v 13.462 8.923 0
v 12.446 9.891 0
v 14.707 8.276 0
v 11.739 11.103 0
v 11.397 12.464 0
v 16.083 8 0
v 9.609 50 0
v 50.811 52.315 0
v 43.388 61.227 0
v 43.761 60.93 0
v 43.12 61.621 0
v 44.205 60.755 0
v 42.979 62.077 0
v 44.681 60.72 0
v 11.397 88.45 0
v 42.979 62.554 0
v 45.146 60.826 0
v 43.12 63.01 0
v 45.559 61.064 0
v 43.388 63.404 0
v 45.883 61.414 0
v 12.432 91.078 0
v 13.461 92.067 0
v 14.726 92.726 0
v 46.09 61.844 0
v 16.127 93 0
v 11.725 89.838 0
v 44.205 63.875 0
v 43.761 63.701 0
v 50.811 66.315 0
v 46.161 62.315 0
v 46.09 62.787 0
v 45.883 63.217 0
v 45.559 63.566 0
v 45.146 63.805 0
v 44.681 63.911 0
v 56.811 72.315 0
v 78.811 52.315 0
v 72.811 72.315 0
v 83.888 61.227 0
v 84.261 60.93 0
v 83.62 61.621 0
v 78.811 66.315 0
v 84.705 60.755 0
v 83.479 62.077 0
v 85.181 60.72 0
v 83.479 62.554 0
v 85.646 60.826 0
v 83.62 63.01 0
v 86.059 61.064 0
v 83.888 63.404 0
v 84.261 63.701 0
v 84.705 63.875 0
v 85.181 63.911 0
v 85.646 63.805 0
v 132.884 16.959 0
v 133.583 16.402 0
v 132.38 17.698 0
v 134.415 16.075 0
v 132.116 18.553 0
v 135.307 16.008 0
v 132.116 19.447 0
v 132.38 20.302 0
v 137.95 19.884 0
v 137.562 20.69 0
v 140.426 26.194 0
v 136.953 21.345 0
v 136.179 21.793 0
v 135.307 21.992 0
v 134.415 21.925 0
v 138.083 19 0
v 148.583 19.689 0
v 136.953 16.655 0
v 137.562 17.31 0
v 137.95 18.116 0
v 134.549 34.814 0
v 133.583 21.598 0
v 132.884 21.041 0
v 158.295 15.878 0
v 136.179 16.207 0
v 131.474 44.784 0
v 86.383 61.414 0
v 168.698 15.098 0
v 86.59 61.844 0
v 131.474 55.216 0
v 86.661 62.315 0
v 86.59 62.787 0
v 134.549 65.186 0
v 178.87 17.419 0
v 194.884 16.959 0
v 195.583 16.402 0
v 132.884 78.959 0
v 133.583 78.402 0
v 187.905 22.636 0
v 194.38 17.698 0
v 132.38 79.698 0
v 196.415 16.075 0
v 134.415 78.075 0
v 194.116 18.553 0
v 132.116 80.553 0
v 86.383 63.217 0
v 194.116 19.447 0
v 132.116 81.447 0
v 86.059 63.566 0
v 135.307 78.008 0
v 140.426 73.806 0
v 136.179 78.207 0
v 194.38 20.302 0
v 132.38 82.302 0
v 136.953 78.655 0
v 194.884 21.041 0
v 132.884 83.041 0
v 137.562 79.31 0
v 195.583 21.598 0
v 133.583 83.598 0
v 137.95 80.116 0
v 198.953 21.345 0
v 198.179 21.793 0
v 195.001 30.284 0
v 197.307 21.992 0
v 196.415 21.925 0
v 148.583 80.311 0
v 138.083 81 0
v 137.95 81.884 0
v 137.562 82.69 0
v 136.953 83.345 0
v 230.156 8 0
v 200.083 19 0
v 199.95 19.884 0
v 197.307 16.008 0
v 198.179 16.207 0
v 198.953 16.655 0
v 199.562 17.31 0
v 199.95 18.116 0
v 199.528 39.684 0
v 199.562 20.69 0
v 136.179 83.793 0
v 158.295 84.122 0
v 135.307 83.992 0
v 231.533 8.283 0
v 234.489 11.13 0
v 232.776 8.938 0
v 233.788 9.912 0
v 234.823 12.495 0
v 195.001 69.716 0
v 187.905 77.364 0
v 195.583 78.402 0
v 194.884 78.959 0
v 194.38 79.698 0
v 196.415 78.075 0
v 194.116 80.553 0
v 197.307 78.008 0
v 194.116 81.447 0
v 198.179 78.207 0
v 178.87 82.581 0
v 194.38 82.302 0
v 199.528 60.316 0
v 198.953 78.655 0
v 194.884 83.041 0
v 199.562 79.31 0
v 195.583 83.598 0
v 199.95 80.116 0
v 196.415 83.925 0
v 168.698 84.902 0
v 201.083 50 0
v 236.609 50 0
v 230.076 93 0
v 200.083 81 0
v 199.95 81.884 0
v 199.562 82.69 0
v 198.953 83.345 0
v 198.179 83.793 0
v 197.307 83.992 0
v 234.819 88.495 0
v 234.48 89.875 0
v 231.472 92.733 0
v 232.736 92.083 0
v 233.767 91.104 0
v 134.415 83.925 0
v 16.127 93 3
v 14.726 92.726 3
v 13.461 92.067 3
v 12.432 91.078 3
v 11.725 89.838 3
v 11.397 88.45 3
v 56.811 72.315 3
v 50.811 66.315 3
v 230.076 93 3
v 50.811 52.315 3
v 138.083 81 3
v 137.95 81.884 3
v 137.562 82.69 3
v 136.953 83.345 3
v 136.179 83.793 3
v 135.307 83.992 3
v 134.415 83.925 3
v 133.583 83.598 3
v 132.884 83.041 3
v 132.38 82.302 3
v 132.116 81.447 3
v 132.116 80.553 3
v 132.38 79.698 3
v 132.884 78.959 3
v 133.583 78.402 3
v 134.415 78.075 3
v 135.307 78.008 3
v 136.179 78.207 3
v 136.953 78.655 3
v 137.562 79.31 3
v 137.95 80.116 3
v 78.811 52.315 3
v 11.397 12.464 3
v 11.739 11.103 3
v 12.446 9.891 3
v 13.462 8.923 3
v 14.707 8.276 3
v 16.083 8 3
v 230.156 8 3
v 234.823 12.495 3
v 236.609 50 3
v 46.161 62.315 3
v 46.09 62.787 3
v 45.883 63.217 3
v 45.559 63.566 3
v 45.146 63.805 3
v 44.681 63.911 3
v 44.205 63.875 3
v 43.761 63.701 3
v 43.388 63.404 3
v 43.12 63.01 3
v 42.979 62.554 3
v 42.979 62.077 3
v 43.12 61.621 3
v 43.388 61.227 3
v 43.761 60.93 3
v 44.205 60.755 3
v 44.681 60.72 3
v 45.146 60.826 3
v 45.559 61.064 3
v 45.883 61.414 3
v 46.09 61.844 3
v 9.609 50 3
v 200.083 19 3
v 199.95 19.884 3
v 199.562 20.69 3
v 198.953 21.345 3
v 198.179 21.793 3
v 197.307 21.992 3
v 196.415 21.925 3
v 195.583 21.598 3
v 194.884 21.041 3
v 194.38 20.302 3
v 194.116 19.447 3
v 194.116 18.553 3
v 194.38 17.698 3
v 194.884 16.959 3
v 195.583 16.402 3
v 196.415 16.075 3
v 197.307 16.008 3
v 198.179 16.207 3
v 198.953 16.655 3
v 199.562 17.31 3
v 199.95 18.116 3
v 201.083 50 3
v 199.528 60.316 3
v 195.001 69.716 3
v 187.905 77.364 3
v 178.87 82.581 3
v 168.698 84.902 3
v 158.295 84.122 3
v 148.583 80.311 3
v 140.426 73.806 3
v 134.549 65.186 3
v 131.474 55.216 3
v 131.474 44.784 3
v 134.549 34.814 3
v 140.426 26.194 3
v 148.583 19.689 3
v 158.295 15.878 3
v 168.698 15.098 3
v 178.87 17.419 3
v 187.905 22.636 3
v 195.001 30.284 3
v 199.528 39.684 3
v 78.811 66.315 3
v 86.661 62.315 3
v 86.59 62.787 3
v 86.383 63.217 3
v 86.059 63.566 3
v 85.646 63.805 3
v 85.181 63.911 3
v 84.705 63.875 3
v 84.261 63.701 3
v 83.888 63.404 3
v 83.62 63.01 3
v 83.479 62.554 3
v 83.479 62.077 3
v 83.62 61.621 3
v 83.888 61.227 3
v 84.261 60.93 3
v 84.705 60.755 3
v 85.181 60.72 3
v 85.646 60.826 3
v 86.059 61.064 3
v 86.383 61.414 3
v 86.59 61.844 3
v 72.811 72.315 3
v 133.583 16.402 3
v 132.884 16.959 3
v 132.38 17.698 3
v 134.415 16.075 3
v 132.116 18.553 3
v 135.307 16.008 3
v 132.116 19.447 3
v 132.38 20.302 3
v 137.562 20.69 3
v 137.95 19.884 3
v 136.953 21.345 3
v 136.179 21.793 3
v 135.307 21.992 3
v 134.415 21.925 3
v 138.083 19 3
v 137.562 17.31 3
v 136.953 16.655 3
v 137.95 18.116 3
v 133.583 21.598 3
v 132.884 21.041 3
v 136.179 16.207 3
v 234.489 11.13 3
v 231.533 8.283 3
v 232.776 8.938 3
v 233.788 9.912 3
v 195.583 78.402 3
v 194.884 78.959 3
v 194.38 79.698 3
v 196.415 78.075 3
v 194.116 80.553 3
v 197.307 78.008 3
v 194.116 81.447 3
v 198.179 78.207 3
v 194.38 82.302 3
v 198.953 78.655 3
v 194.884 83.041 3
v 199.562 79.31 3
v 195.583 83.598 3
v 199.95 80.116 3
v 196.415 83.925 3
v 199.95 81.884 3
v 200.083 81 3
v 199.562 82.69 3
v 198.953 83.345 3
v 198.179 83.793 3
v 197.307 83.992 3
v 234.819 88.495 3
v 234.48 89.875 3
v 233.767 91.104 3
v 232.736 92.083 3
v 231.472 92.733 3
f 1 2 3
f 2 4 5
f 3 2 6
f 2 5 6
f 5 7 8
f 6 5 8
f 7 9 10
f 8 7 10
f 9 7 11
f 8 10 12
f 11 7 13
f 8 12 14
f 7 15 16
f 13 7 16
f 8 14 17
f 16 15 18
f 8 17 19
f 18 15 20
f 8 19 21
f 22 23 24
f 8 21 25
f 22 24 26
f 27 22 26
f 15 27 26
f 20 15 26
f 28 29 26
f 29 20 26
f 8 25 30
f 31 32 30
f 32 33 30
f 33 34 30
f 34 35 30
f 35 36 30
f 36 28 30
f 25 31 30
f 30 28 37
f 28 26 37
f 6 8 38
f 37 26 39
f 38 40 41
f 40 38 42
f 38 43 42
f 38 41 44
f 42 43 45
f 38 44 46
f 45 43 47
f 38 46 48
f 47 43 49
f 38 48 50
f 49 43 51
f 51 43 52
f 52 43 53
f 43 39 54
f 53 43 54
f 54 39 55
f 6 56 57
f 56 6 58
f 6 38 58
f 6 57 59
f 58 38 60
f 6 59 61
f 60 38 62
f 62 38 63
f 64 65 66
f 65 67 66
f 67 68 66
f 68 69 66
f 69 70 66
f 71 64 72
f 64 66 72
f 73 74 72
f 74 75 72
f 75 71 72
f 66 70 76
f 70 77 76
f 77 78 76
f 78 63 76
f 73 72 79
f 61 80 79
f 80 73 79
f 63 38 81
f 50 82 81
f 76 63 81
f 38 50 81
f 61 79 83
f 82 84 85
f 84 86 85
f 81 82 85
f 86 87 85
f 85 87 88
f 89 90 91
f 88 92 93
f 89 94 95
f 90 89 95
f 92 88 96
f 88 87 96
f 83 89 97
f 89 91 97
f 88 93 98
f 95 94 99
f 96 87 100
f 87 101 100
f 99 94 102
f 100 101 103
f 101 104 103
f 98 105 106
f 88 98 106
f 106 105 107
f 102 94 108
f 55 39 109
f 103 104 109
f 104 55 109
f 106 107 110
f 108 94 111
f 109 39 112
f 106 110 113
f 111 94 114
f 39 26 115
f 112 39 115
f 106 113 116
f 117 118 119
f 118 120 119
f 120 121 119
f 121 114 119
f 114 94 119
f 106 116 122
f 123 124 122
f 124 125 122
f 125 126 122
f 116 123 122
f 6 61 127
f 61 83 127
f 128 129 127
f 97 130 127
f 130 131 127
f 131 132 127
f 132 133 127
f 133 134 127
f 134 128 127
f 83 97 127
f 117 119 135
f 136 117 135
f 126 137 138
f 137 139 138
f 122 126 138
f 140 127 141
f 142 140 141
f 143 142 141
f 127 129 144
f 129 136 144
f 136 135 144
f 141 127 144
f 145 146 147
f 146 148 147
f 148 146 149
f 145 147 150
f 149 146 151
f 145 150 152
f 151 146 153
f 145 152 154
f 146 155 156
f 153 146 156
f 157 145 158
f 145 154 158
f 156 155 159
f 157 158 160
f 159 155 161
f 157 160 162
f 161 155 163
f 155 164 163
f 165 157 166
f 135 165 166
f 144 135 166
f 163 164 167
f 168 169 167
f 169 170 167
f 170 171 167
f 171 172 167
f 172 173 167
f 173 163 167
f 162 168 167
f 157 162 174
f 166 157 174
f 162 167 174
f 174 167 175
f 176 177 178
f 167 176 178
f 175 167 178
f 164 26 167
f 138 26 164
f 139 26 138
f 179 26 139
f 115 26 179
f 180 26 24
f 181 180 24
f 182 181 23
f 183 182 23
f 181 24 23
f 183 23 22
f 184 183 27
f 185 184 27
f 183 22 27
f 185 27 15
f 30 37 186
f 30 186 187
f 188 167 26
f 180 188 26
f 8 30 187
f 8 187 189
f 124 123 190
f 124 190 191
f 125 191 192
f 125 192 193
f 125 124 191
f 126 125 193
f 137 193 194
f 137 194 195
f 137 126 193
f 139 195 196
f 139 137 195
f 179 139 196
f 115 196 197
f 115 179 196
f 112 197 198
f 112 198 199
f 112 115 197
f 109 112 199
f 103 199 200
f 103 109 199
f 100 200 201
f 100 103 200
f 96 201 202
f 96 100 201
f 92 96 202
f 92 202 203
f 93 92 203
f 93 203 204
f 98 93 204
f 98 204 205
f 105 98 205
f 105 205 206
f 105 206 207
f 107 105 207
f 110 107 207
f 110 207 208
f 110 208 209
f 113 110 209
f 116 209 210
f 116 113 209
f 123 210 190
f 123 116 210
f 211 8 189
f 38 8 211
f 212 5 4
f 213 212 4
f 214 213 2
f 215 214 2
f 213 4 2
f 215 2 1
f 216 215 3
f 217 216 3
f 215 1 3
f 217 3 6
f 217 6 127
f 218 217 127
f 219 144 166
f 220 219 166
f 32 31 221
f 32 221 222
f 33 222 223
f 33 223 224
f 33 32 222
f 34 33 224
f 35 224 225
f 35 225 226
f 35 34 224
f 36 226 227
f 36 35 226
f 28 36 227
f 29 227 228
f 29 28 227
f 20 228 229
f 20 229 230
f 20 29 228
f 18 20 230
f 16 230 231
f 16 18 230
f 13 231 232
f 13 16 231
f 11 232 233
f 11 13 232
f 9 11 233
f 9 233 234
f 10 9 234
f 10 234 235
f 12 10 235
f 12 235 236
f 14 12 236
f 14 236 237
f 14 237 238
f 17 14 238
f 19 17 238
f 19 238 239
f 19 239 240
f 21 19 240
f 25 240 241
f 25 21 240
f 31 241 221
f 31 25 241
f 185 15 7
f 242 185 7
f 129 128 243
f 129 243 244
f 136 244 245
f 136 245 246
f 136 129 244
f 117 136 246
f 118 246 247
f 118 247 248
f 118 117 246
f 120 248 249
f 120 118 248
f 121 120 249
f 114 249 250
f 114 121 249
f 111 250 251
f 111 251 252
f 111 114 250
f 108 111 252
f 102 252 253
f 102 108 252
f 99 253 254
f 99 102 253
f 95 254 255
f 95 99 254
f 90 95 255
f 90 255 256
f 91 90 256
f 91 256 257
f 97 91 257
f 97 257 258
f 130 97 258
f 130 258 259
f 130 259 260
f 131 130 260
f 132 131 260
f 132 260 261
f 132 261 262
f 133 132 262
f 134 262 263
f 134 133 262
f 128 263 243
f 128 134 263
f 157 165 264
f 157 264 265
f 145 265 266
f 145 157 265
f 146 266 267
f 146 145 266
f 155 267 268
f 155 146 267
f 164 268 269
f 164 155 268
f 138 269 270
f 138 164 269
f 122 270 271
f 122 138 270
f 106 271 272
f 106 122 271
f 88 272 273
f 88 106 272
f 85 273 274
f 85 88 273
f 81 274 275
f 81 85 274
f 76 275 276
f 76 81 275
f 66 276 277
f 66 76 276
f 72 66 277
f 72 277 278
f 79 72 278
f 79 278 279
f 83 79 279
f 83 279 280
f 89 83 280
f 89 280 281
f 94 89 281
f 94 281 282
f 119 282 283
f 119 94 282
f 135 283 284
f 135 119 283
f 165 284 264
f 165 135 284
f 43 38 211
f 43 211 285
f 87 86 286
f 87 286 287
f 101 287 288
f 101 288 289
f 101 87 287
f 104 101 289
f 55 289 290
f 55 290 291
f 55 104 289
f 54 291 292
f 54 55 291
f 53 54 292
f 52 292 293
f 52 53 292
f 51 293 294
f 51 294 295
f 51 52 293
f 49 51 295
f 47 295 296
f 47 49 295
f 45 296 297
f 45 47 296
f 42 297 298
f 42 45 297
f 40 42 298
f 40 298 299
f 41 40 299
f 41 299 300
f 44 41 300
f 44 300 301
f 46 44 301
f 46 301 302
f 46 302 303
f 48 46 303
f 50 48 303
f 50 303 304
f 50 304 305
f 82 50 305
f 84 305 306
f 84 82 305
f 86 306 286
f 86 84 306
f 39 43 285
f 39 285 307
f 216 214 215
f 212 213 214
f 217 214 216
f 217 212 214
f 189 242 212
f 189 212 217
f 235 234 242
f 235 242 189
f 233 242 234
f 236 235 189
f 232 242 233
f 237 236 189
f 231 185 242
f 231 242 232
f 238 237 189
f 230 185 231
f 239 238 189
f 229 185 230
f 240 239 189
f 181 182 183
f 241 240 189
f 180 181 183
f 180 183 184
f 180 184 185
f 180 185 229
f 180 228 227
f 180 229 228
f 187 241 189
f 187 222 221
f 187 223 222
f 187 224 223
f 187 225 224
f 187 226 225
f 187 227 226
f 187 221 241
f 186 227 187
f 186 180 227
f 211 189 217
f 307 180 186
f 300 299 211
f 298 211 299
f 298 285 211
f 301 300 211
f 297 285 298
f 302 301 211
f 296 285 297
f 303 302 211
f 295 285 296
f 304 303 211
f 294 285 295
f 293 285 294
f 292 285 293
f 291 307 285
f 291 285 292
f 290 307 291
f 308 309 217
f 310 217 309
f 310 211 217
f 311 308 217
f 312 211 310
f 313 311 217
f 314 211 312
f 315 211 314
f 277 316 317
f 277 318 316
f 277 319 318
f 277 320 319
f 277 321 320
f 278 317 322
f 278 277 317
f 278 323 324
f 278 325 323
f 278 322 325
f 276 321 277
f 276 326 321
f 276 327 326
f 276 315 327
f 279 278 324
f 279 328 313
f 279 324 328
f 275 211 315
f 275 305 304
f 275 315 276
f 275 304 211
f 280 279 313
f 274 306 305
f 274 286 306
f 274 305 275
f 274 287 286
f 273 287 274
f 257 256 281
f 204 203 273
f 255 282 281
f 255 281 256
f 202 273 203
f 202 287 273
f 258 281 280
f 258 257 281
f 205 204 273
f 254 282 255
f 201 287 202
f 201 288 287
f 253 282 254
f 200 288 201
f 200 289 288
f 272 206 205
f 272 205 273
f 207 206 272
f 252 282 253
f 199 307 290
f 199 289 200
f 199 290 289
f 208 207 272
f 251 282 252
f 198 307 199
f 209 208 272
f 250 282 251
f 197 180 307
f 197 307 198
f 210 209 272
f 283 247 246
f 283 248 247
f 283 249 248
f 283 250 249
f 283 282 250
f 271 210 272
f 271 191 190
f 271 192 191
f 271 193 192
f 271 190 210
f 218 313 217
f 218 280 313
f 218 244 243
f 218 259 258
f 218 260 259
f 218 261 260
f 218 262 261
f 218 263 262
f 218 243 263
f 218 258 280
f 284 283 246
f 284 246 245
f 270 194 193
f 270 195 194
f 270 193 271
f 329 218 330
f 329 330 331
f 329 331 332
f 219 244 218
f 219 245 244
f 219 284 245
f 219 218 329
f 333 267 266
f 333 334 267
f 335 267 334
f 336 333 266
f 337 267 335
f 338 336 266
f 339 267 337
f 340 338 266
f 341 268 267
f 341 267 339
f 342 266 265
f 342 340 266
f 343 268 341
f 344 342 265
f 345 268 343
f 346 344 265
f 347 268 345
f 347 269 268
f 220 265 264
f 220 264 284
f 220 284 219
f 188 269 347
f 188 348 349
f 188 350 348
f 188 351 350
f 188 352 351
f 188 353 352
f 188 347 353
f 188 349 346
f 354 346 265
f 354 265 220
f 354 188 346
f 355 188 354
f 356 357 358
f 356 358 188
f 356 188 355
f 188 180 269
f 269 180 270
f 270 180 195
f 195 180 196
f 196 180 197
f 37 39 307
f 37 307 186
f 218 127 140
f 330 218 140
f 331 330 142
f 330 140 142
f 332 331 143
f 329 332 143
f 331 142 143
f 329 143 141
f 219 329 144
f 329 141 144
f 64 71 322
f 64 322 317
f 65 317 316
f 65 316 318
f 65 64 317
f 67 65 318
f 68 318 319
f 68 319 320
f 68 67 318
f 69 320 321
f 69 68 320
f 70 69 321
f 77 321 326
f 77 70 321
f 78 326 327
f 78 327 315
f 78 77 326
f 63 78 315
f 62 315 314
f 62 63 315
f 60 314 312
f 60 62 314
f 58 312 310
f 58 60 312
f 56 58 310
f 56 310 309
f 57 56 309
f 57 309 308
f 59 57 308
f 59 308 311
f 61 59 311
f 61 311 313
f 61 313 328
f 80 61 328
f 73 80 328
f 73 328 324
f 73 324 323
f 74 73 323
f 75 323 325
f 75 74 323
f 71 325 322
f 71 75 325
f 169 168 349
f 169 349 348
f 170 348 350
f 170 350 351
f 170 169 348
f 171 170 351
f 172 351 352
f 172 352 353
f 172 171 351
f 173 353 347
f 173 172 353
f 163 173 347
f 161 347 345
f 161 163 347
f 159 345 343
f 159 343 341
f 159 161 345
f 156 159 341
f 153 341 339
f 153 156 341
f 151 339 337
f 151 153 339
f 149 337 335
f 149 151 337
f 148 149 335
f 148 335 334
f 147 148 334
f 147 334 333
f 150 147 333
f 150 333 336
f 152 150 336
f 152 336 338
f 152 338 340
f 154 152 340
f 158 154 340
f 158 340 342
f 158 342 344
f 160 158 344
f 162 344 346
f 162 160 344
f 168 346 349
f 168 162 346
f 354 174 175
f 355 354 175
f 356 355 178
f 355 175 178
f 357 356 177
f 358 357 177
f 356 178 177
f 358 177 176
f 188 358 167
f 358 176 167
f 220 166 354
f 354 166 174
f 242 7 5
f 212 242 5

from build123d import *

# Parameters (mm, degrees)
SKETCH_R      = 1.6
SKETCH_R_2    = 3
SKETCH_R_3    = 35
EXTRUDE_DEPTH = 3


with BuildPart() as part:
    # Sketch → Extrude (new body)
    with BuildSketch(Plane.XY):
        with BuildLine():
            Line((16.082868, 8), (230.156125, 8))
            ThreePointArc((230.156125, 8), (233.316389, 9.389315), (234.823147, 12.495299))
            Line((234.823147, 12.495299), (236.609086, 50))
            Line((236.609086, 50), (234.818635, 88.494692))
            ThreePointArc((234.818635, 88.494692), (233.286361, 91.630467), (230.076169, 93))
            Line((230.076169, 93), (16.126662, 93))
            ThreePointArc((16.126662, 93), (12.911047, 91.609366), (11.397447, 88.449769))
            Line((11.397447, 88.449769), (9.609086, 50))
            Line((9.609086, 50), (11.396507, 12.46415))
            ThreePointArc((11.396507, 12.46415), (12.919924, 9.371506), (16.082868, 8))
        make_face()
        with Locations((44.561357, 62.315305)):
            Circle(SKETCH_R, mode=Mode.SUBTRACT)
        with Locations((85.061357, 62.315305)):
            Circle(SKETCH_R, mode=Mode.SUBTRACT)
        with Locations((135.082868, 81)):
            Circle(SKETCH_R_2, mode=Mode.SUBTRACT)
        with Locations((197.082868, 81)):
            Circle(SKETCH_R_2, mode=Mode.SUBTRACT)
        with Locations((197.082868, 19)):
            Circle(SKETCH_R_2, mode=Mode.SUBTRACT)
        with Locations((135.082868, 19)):
            Circle(SKETCH_R_2, mode=Mode.SUBTRACT)
        with Locations((166.082868, 50)):
            Circle(SKETCH_R_3, mode=Mode.SUBTRACT)
        Polygon((78.811357, 66.315305), (72.811357, 72.315305), (56.811357, 72.315305), (50.811357, 66.315305), (50.811357, 52.315305), (78.811357, 52.315305), align=None, mode=Mode.SUBTRACT)
    extrude(amount=EXTRUDE_DEPTH)


solid = part.part
